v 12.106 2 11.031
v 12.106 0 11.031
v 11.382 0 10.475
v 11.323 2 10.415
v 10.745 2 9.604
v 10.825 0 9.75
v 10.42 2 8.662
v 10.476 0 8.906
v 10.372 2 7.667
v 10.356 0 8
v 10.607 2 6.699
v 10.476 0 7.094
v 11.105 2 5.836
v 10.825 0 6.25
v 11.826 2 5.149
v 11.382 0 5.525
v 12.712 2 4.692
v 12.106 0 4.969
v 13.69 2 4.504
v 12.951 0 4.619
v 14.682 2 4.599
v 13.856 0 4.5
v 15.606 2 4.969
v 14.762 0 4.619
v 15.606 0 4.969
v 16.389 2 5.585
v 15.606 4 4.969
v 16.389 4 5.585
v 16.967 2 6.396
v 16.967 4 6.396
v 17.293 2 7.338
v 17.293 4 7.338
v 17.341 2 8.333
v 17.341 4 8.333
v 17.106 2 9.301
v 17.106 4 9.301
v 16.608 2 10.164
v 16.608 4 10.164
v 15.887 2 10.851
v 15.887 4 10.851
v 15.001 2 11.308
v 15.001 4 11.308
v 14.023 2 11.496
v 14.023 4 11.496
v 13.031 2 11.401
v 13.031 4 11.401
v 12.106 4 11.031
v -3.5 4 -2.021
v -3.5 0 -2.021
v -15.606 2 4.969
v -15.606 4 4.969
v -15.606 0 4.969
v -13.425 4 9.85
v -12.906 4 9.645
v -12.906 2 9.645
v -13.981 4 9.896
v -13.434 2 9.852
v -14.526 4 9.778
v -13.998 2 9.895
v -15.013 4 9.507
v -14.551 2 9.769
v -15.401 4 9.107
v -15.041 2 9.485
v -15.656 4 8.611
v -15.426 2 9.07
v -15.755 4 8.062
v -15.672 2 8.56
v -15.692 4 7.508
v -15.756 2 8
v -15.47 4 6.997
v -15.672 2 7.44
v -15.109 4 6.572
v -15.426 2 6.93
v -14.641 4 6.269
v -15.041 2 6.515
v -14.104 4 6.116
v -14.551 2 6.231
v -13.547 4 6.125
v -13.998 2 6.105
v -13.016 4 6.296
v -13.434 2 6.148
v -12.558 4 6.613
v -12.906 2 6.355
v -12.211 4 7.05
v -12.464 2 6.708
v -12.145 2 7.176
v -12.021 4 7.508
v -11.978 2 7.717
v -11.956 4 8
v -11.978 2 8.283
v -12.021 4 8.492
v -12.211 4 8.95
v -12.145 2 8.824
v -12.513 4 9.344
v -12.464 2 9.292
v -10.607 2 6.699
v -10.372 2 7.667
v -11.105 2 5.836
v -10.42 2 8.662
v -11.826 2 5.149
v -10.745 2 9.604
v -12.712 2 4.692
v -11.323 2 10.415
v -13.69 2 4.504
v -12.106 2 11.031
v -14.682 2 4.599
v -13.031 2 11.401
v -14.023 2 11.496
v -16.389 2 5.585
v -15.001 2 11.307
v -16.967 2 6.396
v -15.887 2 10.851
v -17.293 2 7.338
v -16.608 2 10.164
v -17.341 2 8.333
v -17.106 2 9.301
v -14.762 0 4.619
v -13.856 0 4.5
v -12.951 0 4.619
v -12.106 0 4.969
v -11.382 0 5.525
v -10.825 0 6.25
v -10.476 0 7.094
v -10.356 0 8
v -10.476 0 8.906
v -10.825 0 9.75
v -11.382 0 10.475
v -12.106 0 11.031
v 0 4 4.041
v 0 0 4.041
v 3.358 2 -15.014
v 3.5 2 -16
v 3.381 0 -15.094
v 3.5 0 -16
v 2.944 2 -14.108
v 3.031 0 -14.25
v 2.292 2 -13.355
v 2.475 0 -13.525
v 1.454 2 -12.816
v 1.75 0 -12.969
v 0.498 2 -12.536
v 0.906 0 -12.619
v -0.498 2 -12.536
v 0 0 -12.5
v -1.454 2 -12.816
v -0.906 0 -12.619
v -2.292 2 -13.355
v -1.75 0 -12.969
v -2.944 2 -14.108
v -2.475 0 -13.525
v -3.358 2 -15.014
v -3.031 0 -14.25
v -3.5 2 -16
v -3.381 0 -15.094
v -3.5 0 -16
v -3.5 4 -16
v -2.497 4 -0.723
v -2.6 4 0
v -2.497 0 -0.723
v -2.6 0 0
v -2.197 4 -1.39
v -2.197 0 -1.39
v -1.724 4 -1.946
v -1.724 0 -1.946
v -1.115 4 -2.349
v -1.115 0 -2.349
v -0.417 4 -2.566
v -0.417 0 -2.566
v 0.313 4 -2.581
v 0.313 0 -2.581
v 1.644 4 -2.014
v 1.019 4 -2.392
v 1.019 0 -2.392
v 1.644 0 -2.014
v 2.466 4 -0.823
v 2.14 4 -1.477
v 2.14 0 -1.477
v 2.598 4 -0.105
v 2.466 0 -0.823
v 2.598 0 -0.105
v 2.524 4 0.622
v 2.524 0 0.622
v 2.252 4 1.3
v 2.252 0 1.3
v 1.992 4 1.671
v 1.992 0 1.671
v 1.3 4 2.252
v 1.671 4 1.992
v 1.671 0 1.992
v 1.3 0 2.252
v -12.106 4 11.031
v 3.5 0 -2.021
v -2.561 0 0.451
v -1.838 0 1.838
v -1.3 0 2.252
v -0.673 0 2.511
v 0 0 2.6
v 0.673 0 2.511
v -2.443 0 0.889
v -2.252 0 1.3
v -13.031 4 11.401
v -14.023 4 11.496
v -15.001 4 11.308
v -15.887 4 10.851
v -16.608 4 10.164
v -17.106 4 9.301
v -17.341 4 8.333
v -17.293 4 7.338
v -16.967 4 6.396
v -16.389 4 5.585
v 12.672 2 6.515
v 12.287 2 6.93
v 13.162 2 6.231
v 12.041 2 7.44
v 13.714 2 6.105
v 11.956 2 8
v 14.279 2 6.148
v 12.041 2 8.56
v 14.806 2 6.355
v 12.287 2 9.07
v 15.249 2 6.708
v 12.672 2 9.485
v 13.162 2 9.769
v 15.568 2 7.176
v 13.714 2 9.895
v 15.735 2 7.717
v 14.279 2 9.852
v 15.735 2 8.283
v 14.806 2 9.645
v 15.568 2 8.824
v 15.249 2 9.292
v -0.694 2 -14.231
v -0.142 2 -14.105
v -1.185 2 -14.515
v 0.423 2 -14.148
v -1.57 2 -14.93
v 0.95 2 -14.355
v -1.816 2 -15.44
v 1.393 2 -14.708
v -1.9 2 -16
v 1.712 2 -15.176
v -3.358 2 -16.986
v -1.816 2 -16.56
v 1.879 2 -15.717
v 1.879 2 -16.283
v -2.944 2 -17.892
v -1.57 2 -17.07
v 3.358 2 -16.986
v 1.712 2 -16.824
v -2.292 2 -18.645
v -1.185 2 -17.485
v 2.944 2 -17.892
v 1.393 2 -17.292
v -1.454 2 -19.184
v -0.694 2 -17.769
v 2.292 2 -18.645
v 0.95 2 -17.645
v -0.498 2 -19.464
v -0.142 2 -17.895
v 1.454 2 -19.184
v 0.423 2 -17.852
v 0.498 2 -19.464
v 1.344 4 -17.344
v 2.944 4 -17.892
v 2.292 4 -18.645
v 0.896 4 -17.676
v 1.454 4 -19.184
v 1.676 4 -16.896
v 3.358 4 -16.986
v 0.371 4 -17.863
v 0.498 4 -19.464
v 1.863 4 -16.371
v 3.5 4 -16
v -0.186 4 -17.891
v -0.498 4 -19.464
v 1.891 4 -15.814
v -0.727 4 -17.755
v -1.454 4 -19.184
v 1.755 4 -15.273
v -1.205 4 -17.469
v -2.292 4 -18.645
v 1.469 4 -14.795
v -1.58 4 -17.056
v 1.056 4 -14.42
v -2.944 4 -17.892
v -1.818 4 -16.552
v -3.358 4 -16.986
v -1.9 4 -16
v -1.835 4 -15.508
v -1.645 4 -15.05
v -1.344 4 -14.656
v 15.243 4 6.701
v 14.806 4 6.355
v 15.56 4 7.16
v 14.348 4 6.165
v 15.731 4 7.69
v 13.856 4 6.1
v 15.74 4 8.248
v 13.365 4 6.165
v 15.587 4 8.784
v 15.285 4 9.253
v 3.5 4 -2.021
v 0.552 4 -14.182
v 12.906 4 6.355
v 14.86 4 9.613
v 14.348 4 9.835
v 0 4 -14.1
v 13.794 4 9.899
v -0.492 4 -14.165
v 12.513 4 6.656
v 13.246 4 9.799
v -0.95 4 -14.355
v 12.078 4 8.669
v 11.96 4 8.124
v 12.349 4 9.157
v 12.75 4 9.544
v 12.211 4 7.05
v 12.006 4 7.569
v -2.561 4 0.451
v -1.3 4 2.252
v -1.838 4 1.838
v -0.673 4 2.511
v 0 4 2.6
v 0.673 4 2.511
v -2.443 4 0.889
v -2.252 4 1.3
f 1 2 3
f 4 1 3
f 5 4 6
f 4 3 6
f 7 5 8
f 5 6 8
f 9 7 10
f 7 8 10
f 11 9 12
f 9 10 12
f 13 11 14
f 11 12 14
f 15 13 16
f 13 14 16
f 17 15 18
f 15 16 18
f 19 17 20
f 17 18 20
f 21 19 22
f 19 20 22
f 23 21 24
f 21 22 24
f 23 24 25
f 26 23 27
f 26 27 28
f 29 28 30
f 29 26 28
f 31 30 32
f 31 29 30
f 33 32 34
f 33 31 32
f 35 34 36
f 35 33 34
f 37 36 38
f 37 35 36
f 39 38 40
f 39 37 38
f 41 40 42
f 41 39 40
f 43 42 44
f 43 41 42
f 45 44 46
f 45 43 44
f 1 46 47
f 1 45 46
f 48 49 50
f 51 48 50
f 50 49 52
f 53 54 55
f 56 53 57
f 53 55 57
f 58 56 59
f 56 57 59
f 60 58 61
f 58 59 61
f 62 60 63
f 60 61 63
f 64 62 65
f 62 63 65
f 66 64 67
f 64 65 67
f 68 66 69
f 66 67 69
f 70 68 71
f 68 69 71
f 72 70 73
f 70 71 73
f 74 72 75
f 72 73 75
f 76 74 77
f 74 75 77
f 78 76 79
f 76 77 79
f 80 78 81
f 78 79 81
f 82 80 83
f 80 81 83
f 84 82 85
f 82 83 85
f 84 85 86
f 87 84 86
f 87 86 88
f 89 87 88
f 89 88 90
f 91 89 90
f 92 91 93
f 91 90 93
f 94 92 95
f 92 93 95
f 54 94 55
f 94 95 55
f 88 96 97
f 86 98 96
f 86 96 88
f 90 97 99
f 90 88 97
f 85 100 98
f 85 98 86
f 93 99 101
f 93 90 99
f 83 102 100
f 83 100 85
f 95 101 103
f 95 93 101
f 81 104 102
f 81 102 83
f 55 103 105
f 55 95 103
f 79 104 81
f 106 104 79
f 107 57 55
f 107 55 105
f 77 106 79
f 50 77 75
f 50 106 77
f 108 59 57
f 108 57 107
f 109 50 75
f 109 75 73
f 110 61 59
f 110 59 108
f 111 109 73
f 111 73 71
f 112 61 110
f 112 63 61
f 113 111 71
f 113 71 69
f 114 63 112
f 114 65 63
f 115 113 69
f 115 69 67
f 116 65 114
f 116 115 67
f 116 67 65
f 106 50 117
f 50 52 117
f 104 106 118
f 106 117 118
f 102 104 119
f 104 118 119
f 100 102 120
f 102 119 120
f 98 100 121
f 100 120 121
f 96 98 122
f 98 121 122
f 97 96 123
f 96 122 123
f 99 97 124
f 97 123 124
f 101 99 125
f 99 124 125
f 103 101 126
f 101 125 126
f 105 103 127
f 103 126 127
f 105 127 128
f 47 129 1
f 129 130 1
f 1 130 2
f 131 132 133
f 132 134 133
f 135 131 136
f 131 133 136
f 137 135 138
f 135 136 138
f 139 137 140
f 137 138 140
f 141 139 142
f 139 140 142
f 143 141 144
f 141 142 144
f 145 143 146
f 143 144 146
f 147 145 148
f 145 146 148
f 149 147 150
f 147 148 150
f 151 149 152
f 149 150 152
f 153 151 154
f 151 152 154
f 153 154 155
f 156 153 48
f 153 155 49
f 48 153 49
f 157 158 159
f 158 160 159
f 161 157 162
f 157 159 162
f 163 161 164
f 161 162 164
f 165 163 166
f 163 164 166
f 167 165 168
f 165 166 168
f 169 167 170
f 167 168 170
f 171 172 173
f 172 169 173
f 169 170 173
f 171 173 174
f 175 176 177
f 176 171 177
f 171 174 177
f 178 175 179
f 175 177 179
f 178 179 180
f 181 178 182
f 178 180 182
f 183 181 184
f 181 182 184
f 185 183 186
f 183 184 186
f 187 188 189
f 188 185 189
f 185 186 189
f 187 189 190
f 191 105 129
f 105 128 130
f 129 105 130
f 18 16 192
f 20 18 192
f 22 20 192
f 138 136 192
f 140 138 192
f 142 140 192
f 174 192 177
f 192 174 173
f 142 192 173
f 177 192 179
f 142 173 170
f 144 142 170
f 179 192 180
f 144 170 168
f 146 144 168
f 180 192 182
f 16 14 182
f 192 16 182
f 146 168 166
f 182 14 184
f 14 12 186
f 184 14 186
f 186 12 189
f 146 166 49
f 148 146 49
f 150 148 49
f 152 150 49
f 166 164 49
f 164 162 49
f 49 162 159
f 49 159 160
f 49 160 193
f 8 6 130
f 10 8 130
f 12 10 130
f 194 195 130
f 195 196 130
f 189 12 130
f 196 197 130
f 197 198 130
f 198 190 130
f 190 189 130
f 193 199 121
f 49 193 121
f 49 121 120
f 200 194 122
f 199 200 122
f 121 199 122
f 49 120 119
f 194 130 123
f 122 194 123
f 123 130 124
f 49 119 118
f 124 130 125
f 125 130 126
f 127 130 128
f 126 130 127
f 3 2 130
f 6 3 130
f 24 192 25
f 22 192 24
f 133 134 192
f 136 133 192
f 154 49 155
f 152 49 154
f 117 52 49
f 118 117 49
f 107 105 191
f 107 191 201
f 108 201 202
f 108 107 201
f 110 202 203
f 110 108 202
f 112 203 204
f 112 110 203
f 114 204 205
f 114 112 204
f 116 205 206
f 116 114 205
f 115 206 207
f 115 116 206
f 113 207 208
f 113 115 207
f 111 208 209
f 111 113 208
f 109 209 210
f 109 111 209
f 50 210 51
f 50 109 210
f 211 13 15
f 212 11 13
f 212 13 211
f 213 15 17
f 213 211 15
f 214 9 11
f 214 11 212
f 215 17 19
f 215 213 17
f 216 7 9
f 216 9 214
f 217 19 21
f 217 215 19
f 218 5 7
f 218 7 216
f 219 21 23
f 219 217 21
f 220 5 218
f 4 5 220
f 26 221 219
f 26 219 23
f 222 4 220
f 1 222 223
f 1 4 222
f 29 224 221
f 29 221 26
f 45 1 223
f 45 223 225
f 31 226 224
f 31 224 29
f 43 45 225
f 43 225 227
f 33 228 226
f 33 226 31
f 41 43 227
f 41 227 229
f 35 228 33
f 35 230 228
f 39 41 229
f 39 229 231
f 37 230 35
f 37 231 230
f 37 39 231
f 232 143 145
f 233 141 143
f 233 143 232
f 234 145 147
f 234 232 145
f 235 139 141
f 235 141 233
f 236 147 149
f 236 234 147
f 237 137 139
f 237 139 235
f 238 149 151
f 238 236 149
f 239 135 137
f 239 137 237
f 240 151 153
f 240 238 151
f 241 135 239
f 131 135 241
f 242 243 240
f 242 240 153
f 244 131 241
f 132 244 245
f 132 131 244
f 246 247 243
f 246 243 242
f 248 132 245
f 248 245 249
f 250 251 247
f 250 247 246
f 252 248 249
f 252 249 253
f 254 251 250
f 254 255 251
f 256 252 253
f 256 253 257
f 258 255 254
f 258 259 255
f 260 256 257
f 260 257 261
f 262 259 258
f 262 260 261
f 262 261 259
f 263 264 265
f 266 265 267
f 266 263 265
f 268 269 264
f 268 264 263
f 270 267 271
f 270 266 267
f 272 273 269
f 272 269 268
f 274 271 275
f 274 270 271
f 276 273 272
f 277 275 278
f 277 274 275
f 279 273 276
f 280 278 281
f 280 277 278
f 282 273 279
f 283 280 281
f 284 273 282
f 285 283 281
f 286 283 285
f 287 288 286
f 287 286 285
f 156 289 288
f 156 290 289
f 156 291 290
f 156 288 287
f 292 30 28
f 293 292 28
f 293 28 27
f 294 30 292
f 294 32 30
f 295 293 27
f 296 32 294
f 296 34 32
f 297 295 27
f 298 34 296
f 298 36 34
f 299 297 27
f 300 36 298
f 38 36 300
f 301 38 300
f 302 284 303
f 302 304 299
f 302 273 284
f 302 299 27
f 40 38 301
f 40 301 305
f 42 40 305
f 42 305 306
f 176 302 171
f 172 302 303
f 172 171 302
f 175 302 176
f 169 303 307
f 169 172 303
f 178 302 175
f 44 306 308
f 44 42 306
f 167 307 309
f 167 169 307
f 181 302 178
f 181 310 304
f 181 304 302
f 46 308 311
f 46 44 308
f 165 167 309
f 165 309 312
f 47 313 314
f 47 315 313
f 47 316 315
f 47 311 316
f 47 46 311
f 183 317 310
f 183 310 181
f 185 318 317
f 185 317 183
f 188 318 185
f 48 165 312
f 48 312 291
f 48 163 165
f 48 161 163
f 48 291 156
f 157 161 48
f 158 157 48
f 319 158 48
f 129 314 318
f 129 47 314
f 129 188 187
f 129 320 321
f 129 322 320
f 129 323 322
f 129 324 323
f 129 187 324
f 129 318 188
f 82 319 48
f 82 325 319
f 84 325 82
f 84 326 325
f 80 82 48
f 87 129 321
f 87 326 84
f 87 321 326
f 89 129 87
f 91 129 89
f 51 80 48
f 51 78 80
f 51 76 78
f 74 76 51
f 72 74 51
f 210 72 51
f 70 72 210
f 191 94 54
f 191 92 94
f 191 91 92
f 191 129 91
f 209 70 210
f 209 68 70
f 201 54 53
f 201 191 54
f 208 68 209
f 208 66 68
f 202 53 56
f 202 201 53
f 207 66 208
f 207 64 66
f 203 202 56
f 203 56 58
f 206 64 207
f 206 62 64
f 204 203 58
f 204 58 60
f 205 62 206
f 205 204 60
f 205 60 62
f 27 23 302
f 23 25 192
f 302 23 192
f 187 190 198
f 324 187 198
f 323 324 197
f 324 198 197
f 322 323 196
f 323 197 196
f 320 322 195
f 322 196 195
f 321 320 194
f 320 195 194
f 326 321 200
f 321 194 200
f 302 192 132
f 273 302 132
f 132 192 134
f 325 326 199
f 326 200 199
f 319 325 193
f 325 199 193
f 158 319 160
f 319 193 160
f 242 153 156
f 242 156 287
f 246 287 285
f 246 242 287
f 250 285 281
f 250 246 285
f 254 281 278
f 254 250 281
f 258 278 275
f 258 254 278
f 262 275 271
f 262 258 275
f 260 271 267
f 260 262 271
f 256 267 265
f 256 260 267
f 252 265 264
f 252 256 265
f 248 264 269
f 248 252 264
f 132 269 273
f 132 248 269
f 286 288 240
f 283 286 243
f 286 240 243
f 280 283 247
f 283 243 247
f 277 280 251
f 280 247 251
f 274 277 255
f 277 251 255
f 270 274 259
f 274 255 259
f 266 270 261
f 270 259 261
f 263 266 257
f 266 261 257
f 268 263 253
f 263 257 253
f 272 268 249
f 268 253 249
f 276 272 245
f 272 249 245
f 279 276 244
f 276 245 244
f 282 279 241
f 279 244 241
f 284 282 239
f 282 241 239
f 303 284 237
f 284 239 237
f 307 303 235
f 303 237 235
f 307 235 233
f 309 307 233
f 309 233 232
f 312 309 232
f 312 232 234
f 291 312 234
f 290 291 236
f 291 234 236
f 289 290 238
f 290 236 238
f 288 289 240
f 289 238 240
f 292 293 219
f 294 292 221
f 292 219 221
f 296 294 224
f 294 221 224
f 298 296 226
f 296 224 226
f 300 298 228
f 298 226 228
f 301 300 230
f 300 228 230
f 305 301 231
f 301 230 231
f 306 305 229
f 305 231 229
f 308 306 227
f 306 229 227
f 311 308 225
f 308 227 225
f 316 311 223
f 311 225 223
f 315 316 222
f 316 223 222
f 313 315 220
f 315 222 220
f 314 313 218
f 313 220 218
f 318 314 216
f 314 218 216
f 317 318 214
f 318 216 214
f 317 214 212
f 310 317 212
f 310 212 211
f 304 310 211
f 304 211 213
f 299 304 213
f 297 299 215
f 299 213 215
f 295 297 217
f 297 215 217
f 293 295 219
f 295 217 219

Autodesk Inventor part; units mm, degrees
ref_plane "YZ Plane" through (0, 0, 0) normal (1, 0, 0) x (0, 1, 0)
ref_plane "XZ Plane" through (0, 0, 0) normal (0, 1, 0) x (-1, 0, 0)
ref_plane "XY Plane" through (0, 0, 0) normal (0, 0, 1) x (1, 0, 0)
sketch "Эскиз1" plane through (0, 0, 0) normal (0, 1, 0) x (-1, 0, 0)
  point P0 (0, 0)
sketch "Эскиз2" plane through (0, 0, 0) normal (0, 1, 0) x (-1, 0, 0)
  line L0 (0, 0) -> (0, -16)
  circle A0 centre (0, -16) radius 1.9
  circle A1 centre (0, 0) radius 2.6
  line L1 (0, 0) -> (0, -16) construction
  line L2 (-3.5, 0) -> (-3.5, -16)
  line L3 (3.5, -16) -> (3.5, 0)
  arc A2 (3.5, 0) -> (-3.5, 0) centre (0, 0) ccw
  arc A3 (-3.5, -16) -> (3.5, -16) centre (0, -16) ccw
  point P0 (0, -8)
  dimension "d0" = 16
  dimension "d1" = 3.8
  dimension "d2" = 5.2
  dimension "d3" = 7
extrude "Выдавливание1" add sketch "Эскиз2" along normal blind 4
pattern_circular "Круговой массив1" count 3 over 360 about axis through (0, 0, 0) along (0, 1, 0) of "Выдавливание1"
sketch "Эскиз4" plane through (0, 0, 0) normal (0, -1, 0) x (1, 0, 0)
  circle A0 centre (13.8564, 8) radius 1.9 projected
  line L0 (15.6064, 4.9689) -> (3.5, -2.0207) projected
  circle A1 centre (13.8564, 8) radius 3.5
  point P0 (0, 0)
extrude "Выдавливание3" cut sketch "Эскиз4" against normal blind 2
pattern_circular "Круговой массив2" count 3 over 360 about axis through (0, 0, 0) along (0, 1, 0) of "Выдавливание3"
properties part number "gearbox_secondary_gear_holder"
